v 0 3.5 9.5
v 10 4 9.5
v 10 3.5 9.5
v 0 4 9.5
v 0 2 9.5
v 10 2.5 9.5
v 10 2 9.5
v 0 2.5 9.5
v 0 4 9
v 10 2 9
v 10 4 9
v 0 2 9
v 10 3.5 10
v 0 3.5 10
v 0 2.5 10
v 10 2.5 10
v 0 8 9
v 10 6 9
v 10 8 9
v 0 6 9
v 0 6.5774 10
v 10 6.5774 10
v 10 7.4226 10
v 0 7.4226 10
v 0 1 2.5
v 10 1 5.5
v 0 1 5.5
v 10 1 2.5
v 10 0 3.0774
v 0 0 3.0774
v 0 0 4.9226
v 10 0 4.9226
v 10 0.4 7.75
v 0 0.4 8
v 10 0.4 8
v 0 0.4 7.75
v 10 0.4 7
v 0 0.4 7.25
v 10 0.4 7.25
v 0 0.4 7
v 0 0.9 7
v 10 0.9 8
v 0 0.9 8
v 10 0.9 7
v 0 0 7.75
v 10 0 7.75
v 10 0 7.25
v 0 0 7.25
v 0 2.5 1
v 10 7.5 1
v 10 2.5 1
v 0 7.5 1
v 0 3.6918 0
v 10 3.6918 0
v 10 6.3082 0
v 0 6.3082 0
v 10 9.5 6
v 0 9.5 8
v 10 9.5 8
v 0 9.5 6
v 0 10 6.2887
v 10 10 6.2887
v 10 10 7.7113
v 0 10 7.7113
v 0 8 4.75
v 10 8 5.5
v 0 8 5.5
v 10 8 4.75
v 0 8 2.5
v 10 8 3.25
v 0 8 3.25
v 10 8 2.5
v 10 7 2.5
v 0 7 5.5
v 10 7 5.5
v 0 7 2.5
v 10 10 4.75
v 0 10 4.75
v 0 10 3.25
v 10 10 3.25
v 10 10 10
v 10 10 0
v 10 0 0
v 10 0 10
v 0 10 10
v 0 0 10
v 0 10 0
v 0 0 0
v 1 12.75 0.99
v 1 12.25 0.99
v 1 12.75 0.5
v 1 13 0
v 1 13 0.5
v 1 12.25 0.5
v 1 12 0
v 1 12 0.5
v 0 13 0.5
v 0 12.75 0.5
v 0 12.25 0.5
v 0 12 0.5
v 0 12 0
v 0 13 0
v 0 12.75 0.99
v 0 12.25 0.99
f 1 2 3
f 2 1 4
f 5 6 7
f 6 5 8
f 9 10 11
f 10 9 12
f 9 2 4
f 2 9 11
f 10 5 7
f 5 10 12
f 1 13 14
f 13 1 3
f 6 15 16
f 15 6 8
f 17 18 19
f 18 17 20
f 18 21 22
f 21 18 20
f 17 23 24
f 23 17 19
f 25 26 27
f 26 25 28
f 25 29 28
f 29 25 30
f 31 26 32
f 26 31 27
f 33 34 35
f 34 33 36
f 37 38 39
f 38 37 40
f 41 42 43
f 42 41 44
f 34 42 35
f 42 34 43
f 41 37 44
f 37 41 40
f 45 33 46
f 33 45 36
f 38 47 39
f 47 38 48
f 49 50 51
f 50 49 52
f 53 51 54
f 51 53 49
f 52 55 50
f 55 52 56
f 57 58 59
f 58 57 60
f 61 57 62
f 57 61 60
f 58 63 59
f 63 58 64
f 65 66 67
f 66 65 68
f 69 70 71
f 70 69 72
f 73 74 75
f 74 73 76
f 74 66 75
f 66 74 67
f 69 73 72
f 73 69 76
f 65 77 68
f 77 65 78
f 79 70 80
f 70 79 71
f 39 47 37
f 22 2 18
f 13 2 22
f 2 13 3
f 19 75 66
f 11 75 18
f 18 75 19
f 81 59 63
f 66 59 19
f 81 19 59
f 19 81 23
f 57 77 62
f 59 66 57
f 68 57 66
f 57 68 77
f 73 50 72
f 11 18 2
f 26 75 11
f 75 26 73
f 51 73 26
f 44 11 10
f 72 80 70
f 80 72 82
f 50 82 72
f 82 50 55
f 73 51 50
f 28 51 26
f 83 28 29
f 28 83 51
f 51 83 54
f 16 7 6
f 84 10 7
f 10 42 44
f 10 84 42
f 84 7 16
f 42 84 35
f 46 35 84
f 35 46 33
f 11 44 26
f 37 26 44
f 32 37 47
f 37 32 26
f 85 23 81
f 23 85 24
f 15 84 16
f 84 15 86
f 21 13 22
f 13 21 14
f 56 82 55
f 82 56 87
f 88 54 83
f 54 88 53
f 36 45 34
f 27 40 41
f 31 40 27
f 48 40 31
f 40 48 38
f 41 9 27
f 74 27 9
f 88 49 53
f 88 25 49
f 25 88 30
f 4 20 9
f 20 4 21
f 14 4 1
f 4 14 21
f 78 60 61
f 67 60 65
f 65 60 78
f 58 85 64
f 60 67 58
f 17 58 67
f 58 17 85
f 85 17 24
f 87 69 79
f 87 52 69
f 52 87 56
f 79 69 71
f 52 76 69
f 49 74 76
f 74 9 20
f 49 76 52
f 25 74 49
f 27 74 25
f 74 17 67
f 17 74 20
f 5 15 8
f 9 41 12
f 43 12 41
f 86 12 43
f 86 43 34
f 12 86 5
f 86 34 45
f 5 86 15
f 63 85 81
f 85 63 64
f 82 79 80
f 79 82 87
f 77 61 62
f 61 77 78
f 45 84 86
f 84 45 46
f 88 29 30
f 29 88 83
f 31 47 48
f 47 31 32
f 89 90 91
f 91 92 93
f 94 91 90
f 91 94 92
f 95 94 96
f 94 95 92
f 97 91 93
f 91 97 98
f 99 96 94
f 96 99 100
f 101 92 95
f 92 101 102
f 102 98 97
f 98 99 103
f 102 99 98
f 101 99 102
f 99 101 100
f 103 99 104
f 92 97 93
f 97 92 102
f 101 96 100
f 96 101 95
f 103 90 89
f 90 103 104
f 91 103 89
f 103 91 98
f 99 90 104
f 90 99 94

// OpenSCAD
//dovetail, defaults to x-plane.
module dovetail(width, depth, angle, len){
	difference(){
	cube([len,width,depth]);

	rotate(angle, [1,0,0])
	cube([len,depth+1,depth]);
	
	translate([0,width,0])
	mirror([0,1,0])
	rotate(angle, [1,0,0])
		cube([len,depth+1,depth]);		
 	}
}

// t-slot with throat width, throat depth,
// headspace width, headspace depth, and
// overall length.
// default orientation in the x-plane.
module tslot(throat_w, throat_d, hs_w, hs_d, len){
	
	//the heaspace area
	cube([len, hs_w, hs_d]);

	//the bolt channel. 
	translate([0,(-throat_w/2)-(-hs_w/2),hs_d-0.01])
	cube([len, throat_w, throat_d]);
	
}

//example
//creates a block with slots. 

difference(){
color("blue")
cube([10,10,10]);

translate([-1,2,9])
tslot(1,1,2,0.5,12);

translate([-1,6,9])
dovetail(2,5,60,12);

rotate(90,[1,0,0])
translate([-1,2.5,-1])
dovetail(3,2,60,12);

rotate(90,[1,0,0])
translate([-1,7,-0.9])
tslot(0.5,0.5,1,0.5,12);

rotate(90,[1,0,0])
mirror([0,1,1,])
translate([-1,2.5,-1])
dovetail(5,2,40,12);

rotate(180,[1,0,0])
mirror([0,1,1])
translate([-1,6,9.5])
dovetail(2,1,60,12);

rotate(180,[1,0,0])
mirror([0,1,1])
translate([-1,2.5,7])
tslot(1.5,3,3,1,12);
}

//you can also make a t-nut by threading a hole through a un-subtracted t-slot.
translate([0,12,0])
tslot(0.5,0.5,1,0.5,1);
